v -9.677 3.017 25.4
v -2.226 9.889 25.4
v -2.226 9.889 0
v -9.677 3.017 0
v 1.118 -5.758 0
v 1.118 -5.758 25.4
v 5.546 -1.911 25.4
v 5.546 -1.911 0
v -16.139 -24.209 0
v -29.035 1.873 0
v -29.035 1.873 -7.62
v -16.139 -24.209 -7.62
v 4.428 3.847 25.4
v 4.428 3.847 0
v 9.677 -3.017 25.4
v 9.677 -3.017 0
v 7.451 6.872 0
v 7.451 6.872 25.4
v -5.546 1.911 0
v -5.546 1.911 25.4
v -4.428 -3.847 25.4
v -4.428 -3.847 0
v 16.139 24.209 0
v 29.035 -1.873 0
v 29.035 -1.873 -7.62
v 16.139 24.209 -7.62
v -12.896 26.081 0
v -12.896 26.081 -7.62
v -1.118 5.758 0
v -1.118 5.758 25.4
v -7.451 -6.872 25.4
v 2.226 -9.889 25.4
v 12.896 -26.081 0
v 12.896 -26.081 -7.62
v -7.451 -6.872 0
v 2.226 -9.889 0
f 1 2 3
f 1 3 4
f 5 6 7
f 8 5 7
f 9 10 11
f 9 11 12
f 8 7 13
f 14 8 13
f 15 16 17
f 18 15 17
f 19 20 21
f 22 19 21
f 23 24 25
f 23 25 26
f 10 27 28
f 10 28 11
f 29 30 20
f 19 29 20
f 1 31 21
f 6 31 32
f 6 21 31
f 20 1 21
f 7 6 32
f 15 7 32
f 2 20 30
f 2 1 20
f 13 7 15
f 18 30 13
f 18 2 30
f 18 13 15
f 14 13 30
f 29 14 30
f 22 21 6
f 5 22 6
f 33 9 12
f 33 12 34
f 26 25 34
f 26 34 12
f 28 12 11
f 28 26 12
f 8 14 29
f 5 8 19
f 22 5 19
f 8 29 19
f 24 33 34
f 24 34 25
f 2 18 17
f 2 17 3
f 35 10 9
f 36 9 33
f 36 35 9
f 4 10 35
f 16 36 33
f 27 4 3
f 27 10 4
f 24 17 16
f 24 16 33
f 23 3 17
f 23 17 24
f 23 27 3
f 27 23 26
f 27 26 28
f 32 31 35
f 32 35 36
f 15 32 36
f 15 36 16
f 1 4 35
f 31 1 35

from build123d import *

# Parameters (mm, degrees)
BOSS_EXTRUDE1_DEPTH      = 7.62
BOSS_EXTRUDE2_DEPTH      = 25.4
BOSS_EXTRUDE2_DEPTH_BACK = 7.62
BOSS_EXTRUDE3_DEPTH      = 7.62


with BuildPart() as part:
    # Sketch1 → Boss-Extrude1 (new body)
    with BuildSketch(Plane.XY):
        Polygon((29.034826066, -1.872543671), (16.139083421, 24.208625132), (-12.895742644, 26.081168803), (-29.034826066, 1.872543671), (-16.139083421, -24.208625132), (12.895742644, -26.081168803), align=None)
        Polygon((-2.225944347, 9.889162812), (7.451294044, 6.872305758), (9.677238391, -3.016857054), (2.225944347, -9.889162812), (-7.451294044, -6.872305758), (-9.677238391, 3.016857054), align=None, mode=Mode.SUBTRACT)
    extrude(amount=-BOSS_EXTRUDE1_DEPTH)

    # Sketch1<3> → Boss-Extrude2 (add, two sides: drawn at the far end of the back side and taken through both)
    with BuildSketch(Plane.XY.offset(-BOSS_EXTRUDE2_DEPTH_BACK)):
        Polygon((9.677238391, -3.016857054), (7.451294044, 6.872305758), (-2.225944347, 9.889162812), (-9.677238391, 3.016857054), (-7.451294044, -6.872305758), (2.225944347, -9.889162812), align=None)
        Polygon((-1.117880084, 5.758374549), (4.427958602, 3.847299826), (5.545838686, -1.911074723), (1.117880084, -5.758374549), (-4.427958602, -3.847299826), (-5.545838686, 1.911074723), align=None, mode=Mode.SUBTRACT)
    extrude(amount=BOSS_EXTRUDE2_DEPTH + BOSS_EXTRUDE2_DEPTH_BACK)

    # Sketch2 → Boss-Extrude3 (add)
    with BuildSketch(Plane(origin=(0, 0, -7.62), x_dir=(-1, 0, 0), z_dir=(0, 0, -1))):
        Polygon((1.117880084, 5.758374549), (-4.427958602, 3.847299826), (-5.545838686, -1.911074723), (-1.117880084, -5.758374549), (4.427958602, -3.847299826), (5.545838686, 1.911074723), align=None)
    extrude(amount=-BOSS_EXTRUDE3_DEPTH)


solid = part.part
